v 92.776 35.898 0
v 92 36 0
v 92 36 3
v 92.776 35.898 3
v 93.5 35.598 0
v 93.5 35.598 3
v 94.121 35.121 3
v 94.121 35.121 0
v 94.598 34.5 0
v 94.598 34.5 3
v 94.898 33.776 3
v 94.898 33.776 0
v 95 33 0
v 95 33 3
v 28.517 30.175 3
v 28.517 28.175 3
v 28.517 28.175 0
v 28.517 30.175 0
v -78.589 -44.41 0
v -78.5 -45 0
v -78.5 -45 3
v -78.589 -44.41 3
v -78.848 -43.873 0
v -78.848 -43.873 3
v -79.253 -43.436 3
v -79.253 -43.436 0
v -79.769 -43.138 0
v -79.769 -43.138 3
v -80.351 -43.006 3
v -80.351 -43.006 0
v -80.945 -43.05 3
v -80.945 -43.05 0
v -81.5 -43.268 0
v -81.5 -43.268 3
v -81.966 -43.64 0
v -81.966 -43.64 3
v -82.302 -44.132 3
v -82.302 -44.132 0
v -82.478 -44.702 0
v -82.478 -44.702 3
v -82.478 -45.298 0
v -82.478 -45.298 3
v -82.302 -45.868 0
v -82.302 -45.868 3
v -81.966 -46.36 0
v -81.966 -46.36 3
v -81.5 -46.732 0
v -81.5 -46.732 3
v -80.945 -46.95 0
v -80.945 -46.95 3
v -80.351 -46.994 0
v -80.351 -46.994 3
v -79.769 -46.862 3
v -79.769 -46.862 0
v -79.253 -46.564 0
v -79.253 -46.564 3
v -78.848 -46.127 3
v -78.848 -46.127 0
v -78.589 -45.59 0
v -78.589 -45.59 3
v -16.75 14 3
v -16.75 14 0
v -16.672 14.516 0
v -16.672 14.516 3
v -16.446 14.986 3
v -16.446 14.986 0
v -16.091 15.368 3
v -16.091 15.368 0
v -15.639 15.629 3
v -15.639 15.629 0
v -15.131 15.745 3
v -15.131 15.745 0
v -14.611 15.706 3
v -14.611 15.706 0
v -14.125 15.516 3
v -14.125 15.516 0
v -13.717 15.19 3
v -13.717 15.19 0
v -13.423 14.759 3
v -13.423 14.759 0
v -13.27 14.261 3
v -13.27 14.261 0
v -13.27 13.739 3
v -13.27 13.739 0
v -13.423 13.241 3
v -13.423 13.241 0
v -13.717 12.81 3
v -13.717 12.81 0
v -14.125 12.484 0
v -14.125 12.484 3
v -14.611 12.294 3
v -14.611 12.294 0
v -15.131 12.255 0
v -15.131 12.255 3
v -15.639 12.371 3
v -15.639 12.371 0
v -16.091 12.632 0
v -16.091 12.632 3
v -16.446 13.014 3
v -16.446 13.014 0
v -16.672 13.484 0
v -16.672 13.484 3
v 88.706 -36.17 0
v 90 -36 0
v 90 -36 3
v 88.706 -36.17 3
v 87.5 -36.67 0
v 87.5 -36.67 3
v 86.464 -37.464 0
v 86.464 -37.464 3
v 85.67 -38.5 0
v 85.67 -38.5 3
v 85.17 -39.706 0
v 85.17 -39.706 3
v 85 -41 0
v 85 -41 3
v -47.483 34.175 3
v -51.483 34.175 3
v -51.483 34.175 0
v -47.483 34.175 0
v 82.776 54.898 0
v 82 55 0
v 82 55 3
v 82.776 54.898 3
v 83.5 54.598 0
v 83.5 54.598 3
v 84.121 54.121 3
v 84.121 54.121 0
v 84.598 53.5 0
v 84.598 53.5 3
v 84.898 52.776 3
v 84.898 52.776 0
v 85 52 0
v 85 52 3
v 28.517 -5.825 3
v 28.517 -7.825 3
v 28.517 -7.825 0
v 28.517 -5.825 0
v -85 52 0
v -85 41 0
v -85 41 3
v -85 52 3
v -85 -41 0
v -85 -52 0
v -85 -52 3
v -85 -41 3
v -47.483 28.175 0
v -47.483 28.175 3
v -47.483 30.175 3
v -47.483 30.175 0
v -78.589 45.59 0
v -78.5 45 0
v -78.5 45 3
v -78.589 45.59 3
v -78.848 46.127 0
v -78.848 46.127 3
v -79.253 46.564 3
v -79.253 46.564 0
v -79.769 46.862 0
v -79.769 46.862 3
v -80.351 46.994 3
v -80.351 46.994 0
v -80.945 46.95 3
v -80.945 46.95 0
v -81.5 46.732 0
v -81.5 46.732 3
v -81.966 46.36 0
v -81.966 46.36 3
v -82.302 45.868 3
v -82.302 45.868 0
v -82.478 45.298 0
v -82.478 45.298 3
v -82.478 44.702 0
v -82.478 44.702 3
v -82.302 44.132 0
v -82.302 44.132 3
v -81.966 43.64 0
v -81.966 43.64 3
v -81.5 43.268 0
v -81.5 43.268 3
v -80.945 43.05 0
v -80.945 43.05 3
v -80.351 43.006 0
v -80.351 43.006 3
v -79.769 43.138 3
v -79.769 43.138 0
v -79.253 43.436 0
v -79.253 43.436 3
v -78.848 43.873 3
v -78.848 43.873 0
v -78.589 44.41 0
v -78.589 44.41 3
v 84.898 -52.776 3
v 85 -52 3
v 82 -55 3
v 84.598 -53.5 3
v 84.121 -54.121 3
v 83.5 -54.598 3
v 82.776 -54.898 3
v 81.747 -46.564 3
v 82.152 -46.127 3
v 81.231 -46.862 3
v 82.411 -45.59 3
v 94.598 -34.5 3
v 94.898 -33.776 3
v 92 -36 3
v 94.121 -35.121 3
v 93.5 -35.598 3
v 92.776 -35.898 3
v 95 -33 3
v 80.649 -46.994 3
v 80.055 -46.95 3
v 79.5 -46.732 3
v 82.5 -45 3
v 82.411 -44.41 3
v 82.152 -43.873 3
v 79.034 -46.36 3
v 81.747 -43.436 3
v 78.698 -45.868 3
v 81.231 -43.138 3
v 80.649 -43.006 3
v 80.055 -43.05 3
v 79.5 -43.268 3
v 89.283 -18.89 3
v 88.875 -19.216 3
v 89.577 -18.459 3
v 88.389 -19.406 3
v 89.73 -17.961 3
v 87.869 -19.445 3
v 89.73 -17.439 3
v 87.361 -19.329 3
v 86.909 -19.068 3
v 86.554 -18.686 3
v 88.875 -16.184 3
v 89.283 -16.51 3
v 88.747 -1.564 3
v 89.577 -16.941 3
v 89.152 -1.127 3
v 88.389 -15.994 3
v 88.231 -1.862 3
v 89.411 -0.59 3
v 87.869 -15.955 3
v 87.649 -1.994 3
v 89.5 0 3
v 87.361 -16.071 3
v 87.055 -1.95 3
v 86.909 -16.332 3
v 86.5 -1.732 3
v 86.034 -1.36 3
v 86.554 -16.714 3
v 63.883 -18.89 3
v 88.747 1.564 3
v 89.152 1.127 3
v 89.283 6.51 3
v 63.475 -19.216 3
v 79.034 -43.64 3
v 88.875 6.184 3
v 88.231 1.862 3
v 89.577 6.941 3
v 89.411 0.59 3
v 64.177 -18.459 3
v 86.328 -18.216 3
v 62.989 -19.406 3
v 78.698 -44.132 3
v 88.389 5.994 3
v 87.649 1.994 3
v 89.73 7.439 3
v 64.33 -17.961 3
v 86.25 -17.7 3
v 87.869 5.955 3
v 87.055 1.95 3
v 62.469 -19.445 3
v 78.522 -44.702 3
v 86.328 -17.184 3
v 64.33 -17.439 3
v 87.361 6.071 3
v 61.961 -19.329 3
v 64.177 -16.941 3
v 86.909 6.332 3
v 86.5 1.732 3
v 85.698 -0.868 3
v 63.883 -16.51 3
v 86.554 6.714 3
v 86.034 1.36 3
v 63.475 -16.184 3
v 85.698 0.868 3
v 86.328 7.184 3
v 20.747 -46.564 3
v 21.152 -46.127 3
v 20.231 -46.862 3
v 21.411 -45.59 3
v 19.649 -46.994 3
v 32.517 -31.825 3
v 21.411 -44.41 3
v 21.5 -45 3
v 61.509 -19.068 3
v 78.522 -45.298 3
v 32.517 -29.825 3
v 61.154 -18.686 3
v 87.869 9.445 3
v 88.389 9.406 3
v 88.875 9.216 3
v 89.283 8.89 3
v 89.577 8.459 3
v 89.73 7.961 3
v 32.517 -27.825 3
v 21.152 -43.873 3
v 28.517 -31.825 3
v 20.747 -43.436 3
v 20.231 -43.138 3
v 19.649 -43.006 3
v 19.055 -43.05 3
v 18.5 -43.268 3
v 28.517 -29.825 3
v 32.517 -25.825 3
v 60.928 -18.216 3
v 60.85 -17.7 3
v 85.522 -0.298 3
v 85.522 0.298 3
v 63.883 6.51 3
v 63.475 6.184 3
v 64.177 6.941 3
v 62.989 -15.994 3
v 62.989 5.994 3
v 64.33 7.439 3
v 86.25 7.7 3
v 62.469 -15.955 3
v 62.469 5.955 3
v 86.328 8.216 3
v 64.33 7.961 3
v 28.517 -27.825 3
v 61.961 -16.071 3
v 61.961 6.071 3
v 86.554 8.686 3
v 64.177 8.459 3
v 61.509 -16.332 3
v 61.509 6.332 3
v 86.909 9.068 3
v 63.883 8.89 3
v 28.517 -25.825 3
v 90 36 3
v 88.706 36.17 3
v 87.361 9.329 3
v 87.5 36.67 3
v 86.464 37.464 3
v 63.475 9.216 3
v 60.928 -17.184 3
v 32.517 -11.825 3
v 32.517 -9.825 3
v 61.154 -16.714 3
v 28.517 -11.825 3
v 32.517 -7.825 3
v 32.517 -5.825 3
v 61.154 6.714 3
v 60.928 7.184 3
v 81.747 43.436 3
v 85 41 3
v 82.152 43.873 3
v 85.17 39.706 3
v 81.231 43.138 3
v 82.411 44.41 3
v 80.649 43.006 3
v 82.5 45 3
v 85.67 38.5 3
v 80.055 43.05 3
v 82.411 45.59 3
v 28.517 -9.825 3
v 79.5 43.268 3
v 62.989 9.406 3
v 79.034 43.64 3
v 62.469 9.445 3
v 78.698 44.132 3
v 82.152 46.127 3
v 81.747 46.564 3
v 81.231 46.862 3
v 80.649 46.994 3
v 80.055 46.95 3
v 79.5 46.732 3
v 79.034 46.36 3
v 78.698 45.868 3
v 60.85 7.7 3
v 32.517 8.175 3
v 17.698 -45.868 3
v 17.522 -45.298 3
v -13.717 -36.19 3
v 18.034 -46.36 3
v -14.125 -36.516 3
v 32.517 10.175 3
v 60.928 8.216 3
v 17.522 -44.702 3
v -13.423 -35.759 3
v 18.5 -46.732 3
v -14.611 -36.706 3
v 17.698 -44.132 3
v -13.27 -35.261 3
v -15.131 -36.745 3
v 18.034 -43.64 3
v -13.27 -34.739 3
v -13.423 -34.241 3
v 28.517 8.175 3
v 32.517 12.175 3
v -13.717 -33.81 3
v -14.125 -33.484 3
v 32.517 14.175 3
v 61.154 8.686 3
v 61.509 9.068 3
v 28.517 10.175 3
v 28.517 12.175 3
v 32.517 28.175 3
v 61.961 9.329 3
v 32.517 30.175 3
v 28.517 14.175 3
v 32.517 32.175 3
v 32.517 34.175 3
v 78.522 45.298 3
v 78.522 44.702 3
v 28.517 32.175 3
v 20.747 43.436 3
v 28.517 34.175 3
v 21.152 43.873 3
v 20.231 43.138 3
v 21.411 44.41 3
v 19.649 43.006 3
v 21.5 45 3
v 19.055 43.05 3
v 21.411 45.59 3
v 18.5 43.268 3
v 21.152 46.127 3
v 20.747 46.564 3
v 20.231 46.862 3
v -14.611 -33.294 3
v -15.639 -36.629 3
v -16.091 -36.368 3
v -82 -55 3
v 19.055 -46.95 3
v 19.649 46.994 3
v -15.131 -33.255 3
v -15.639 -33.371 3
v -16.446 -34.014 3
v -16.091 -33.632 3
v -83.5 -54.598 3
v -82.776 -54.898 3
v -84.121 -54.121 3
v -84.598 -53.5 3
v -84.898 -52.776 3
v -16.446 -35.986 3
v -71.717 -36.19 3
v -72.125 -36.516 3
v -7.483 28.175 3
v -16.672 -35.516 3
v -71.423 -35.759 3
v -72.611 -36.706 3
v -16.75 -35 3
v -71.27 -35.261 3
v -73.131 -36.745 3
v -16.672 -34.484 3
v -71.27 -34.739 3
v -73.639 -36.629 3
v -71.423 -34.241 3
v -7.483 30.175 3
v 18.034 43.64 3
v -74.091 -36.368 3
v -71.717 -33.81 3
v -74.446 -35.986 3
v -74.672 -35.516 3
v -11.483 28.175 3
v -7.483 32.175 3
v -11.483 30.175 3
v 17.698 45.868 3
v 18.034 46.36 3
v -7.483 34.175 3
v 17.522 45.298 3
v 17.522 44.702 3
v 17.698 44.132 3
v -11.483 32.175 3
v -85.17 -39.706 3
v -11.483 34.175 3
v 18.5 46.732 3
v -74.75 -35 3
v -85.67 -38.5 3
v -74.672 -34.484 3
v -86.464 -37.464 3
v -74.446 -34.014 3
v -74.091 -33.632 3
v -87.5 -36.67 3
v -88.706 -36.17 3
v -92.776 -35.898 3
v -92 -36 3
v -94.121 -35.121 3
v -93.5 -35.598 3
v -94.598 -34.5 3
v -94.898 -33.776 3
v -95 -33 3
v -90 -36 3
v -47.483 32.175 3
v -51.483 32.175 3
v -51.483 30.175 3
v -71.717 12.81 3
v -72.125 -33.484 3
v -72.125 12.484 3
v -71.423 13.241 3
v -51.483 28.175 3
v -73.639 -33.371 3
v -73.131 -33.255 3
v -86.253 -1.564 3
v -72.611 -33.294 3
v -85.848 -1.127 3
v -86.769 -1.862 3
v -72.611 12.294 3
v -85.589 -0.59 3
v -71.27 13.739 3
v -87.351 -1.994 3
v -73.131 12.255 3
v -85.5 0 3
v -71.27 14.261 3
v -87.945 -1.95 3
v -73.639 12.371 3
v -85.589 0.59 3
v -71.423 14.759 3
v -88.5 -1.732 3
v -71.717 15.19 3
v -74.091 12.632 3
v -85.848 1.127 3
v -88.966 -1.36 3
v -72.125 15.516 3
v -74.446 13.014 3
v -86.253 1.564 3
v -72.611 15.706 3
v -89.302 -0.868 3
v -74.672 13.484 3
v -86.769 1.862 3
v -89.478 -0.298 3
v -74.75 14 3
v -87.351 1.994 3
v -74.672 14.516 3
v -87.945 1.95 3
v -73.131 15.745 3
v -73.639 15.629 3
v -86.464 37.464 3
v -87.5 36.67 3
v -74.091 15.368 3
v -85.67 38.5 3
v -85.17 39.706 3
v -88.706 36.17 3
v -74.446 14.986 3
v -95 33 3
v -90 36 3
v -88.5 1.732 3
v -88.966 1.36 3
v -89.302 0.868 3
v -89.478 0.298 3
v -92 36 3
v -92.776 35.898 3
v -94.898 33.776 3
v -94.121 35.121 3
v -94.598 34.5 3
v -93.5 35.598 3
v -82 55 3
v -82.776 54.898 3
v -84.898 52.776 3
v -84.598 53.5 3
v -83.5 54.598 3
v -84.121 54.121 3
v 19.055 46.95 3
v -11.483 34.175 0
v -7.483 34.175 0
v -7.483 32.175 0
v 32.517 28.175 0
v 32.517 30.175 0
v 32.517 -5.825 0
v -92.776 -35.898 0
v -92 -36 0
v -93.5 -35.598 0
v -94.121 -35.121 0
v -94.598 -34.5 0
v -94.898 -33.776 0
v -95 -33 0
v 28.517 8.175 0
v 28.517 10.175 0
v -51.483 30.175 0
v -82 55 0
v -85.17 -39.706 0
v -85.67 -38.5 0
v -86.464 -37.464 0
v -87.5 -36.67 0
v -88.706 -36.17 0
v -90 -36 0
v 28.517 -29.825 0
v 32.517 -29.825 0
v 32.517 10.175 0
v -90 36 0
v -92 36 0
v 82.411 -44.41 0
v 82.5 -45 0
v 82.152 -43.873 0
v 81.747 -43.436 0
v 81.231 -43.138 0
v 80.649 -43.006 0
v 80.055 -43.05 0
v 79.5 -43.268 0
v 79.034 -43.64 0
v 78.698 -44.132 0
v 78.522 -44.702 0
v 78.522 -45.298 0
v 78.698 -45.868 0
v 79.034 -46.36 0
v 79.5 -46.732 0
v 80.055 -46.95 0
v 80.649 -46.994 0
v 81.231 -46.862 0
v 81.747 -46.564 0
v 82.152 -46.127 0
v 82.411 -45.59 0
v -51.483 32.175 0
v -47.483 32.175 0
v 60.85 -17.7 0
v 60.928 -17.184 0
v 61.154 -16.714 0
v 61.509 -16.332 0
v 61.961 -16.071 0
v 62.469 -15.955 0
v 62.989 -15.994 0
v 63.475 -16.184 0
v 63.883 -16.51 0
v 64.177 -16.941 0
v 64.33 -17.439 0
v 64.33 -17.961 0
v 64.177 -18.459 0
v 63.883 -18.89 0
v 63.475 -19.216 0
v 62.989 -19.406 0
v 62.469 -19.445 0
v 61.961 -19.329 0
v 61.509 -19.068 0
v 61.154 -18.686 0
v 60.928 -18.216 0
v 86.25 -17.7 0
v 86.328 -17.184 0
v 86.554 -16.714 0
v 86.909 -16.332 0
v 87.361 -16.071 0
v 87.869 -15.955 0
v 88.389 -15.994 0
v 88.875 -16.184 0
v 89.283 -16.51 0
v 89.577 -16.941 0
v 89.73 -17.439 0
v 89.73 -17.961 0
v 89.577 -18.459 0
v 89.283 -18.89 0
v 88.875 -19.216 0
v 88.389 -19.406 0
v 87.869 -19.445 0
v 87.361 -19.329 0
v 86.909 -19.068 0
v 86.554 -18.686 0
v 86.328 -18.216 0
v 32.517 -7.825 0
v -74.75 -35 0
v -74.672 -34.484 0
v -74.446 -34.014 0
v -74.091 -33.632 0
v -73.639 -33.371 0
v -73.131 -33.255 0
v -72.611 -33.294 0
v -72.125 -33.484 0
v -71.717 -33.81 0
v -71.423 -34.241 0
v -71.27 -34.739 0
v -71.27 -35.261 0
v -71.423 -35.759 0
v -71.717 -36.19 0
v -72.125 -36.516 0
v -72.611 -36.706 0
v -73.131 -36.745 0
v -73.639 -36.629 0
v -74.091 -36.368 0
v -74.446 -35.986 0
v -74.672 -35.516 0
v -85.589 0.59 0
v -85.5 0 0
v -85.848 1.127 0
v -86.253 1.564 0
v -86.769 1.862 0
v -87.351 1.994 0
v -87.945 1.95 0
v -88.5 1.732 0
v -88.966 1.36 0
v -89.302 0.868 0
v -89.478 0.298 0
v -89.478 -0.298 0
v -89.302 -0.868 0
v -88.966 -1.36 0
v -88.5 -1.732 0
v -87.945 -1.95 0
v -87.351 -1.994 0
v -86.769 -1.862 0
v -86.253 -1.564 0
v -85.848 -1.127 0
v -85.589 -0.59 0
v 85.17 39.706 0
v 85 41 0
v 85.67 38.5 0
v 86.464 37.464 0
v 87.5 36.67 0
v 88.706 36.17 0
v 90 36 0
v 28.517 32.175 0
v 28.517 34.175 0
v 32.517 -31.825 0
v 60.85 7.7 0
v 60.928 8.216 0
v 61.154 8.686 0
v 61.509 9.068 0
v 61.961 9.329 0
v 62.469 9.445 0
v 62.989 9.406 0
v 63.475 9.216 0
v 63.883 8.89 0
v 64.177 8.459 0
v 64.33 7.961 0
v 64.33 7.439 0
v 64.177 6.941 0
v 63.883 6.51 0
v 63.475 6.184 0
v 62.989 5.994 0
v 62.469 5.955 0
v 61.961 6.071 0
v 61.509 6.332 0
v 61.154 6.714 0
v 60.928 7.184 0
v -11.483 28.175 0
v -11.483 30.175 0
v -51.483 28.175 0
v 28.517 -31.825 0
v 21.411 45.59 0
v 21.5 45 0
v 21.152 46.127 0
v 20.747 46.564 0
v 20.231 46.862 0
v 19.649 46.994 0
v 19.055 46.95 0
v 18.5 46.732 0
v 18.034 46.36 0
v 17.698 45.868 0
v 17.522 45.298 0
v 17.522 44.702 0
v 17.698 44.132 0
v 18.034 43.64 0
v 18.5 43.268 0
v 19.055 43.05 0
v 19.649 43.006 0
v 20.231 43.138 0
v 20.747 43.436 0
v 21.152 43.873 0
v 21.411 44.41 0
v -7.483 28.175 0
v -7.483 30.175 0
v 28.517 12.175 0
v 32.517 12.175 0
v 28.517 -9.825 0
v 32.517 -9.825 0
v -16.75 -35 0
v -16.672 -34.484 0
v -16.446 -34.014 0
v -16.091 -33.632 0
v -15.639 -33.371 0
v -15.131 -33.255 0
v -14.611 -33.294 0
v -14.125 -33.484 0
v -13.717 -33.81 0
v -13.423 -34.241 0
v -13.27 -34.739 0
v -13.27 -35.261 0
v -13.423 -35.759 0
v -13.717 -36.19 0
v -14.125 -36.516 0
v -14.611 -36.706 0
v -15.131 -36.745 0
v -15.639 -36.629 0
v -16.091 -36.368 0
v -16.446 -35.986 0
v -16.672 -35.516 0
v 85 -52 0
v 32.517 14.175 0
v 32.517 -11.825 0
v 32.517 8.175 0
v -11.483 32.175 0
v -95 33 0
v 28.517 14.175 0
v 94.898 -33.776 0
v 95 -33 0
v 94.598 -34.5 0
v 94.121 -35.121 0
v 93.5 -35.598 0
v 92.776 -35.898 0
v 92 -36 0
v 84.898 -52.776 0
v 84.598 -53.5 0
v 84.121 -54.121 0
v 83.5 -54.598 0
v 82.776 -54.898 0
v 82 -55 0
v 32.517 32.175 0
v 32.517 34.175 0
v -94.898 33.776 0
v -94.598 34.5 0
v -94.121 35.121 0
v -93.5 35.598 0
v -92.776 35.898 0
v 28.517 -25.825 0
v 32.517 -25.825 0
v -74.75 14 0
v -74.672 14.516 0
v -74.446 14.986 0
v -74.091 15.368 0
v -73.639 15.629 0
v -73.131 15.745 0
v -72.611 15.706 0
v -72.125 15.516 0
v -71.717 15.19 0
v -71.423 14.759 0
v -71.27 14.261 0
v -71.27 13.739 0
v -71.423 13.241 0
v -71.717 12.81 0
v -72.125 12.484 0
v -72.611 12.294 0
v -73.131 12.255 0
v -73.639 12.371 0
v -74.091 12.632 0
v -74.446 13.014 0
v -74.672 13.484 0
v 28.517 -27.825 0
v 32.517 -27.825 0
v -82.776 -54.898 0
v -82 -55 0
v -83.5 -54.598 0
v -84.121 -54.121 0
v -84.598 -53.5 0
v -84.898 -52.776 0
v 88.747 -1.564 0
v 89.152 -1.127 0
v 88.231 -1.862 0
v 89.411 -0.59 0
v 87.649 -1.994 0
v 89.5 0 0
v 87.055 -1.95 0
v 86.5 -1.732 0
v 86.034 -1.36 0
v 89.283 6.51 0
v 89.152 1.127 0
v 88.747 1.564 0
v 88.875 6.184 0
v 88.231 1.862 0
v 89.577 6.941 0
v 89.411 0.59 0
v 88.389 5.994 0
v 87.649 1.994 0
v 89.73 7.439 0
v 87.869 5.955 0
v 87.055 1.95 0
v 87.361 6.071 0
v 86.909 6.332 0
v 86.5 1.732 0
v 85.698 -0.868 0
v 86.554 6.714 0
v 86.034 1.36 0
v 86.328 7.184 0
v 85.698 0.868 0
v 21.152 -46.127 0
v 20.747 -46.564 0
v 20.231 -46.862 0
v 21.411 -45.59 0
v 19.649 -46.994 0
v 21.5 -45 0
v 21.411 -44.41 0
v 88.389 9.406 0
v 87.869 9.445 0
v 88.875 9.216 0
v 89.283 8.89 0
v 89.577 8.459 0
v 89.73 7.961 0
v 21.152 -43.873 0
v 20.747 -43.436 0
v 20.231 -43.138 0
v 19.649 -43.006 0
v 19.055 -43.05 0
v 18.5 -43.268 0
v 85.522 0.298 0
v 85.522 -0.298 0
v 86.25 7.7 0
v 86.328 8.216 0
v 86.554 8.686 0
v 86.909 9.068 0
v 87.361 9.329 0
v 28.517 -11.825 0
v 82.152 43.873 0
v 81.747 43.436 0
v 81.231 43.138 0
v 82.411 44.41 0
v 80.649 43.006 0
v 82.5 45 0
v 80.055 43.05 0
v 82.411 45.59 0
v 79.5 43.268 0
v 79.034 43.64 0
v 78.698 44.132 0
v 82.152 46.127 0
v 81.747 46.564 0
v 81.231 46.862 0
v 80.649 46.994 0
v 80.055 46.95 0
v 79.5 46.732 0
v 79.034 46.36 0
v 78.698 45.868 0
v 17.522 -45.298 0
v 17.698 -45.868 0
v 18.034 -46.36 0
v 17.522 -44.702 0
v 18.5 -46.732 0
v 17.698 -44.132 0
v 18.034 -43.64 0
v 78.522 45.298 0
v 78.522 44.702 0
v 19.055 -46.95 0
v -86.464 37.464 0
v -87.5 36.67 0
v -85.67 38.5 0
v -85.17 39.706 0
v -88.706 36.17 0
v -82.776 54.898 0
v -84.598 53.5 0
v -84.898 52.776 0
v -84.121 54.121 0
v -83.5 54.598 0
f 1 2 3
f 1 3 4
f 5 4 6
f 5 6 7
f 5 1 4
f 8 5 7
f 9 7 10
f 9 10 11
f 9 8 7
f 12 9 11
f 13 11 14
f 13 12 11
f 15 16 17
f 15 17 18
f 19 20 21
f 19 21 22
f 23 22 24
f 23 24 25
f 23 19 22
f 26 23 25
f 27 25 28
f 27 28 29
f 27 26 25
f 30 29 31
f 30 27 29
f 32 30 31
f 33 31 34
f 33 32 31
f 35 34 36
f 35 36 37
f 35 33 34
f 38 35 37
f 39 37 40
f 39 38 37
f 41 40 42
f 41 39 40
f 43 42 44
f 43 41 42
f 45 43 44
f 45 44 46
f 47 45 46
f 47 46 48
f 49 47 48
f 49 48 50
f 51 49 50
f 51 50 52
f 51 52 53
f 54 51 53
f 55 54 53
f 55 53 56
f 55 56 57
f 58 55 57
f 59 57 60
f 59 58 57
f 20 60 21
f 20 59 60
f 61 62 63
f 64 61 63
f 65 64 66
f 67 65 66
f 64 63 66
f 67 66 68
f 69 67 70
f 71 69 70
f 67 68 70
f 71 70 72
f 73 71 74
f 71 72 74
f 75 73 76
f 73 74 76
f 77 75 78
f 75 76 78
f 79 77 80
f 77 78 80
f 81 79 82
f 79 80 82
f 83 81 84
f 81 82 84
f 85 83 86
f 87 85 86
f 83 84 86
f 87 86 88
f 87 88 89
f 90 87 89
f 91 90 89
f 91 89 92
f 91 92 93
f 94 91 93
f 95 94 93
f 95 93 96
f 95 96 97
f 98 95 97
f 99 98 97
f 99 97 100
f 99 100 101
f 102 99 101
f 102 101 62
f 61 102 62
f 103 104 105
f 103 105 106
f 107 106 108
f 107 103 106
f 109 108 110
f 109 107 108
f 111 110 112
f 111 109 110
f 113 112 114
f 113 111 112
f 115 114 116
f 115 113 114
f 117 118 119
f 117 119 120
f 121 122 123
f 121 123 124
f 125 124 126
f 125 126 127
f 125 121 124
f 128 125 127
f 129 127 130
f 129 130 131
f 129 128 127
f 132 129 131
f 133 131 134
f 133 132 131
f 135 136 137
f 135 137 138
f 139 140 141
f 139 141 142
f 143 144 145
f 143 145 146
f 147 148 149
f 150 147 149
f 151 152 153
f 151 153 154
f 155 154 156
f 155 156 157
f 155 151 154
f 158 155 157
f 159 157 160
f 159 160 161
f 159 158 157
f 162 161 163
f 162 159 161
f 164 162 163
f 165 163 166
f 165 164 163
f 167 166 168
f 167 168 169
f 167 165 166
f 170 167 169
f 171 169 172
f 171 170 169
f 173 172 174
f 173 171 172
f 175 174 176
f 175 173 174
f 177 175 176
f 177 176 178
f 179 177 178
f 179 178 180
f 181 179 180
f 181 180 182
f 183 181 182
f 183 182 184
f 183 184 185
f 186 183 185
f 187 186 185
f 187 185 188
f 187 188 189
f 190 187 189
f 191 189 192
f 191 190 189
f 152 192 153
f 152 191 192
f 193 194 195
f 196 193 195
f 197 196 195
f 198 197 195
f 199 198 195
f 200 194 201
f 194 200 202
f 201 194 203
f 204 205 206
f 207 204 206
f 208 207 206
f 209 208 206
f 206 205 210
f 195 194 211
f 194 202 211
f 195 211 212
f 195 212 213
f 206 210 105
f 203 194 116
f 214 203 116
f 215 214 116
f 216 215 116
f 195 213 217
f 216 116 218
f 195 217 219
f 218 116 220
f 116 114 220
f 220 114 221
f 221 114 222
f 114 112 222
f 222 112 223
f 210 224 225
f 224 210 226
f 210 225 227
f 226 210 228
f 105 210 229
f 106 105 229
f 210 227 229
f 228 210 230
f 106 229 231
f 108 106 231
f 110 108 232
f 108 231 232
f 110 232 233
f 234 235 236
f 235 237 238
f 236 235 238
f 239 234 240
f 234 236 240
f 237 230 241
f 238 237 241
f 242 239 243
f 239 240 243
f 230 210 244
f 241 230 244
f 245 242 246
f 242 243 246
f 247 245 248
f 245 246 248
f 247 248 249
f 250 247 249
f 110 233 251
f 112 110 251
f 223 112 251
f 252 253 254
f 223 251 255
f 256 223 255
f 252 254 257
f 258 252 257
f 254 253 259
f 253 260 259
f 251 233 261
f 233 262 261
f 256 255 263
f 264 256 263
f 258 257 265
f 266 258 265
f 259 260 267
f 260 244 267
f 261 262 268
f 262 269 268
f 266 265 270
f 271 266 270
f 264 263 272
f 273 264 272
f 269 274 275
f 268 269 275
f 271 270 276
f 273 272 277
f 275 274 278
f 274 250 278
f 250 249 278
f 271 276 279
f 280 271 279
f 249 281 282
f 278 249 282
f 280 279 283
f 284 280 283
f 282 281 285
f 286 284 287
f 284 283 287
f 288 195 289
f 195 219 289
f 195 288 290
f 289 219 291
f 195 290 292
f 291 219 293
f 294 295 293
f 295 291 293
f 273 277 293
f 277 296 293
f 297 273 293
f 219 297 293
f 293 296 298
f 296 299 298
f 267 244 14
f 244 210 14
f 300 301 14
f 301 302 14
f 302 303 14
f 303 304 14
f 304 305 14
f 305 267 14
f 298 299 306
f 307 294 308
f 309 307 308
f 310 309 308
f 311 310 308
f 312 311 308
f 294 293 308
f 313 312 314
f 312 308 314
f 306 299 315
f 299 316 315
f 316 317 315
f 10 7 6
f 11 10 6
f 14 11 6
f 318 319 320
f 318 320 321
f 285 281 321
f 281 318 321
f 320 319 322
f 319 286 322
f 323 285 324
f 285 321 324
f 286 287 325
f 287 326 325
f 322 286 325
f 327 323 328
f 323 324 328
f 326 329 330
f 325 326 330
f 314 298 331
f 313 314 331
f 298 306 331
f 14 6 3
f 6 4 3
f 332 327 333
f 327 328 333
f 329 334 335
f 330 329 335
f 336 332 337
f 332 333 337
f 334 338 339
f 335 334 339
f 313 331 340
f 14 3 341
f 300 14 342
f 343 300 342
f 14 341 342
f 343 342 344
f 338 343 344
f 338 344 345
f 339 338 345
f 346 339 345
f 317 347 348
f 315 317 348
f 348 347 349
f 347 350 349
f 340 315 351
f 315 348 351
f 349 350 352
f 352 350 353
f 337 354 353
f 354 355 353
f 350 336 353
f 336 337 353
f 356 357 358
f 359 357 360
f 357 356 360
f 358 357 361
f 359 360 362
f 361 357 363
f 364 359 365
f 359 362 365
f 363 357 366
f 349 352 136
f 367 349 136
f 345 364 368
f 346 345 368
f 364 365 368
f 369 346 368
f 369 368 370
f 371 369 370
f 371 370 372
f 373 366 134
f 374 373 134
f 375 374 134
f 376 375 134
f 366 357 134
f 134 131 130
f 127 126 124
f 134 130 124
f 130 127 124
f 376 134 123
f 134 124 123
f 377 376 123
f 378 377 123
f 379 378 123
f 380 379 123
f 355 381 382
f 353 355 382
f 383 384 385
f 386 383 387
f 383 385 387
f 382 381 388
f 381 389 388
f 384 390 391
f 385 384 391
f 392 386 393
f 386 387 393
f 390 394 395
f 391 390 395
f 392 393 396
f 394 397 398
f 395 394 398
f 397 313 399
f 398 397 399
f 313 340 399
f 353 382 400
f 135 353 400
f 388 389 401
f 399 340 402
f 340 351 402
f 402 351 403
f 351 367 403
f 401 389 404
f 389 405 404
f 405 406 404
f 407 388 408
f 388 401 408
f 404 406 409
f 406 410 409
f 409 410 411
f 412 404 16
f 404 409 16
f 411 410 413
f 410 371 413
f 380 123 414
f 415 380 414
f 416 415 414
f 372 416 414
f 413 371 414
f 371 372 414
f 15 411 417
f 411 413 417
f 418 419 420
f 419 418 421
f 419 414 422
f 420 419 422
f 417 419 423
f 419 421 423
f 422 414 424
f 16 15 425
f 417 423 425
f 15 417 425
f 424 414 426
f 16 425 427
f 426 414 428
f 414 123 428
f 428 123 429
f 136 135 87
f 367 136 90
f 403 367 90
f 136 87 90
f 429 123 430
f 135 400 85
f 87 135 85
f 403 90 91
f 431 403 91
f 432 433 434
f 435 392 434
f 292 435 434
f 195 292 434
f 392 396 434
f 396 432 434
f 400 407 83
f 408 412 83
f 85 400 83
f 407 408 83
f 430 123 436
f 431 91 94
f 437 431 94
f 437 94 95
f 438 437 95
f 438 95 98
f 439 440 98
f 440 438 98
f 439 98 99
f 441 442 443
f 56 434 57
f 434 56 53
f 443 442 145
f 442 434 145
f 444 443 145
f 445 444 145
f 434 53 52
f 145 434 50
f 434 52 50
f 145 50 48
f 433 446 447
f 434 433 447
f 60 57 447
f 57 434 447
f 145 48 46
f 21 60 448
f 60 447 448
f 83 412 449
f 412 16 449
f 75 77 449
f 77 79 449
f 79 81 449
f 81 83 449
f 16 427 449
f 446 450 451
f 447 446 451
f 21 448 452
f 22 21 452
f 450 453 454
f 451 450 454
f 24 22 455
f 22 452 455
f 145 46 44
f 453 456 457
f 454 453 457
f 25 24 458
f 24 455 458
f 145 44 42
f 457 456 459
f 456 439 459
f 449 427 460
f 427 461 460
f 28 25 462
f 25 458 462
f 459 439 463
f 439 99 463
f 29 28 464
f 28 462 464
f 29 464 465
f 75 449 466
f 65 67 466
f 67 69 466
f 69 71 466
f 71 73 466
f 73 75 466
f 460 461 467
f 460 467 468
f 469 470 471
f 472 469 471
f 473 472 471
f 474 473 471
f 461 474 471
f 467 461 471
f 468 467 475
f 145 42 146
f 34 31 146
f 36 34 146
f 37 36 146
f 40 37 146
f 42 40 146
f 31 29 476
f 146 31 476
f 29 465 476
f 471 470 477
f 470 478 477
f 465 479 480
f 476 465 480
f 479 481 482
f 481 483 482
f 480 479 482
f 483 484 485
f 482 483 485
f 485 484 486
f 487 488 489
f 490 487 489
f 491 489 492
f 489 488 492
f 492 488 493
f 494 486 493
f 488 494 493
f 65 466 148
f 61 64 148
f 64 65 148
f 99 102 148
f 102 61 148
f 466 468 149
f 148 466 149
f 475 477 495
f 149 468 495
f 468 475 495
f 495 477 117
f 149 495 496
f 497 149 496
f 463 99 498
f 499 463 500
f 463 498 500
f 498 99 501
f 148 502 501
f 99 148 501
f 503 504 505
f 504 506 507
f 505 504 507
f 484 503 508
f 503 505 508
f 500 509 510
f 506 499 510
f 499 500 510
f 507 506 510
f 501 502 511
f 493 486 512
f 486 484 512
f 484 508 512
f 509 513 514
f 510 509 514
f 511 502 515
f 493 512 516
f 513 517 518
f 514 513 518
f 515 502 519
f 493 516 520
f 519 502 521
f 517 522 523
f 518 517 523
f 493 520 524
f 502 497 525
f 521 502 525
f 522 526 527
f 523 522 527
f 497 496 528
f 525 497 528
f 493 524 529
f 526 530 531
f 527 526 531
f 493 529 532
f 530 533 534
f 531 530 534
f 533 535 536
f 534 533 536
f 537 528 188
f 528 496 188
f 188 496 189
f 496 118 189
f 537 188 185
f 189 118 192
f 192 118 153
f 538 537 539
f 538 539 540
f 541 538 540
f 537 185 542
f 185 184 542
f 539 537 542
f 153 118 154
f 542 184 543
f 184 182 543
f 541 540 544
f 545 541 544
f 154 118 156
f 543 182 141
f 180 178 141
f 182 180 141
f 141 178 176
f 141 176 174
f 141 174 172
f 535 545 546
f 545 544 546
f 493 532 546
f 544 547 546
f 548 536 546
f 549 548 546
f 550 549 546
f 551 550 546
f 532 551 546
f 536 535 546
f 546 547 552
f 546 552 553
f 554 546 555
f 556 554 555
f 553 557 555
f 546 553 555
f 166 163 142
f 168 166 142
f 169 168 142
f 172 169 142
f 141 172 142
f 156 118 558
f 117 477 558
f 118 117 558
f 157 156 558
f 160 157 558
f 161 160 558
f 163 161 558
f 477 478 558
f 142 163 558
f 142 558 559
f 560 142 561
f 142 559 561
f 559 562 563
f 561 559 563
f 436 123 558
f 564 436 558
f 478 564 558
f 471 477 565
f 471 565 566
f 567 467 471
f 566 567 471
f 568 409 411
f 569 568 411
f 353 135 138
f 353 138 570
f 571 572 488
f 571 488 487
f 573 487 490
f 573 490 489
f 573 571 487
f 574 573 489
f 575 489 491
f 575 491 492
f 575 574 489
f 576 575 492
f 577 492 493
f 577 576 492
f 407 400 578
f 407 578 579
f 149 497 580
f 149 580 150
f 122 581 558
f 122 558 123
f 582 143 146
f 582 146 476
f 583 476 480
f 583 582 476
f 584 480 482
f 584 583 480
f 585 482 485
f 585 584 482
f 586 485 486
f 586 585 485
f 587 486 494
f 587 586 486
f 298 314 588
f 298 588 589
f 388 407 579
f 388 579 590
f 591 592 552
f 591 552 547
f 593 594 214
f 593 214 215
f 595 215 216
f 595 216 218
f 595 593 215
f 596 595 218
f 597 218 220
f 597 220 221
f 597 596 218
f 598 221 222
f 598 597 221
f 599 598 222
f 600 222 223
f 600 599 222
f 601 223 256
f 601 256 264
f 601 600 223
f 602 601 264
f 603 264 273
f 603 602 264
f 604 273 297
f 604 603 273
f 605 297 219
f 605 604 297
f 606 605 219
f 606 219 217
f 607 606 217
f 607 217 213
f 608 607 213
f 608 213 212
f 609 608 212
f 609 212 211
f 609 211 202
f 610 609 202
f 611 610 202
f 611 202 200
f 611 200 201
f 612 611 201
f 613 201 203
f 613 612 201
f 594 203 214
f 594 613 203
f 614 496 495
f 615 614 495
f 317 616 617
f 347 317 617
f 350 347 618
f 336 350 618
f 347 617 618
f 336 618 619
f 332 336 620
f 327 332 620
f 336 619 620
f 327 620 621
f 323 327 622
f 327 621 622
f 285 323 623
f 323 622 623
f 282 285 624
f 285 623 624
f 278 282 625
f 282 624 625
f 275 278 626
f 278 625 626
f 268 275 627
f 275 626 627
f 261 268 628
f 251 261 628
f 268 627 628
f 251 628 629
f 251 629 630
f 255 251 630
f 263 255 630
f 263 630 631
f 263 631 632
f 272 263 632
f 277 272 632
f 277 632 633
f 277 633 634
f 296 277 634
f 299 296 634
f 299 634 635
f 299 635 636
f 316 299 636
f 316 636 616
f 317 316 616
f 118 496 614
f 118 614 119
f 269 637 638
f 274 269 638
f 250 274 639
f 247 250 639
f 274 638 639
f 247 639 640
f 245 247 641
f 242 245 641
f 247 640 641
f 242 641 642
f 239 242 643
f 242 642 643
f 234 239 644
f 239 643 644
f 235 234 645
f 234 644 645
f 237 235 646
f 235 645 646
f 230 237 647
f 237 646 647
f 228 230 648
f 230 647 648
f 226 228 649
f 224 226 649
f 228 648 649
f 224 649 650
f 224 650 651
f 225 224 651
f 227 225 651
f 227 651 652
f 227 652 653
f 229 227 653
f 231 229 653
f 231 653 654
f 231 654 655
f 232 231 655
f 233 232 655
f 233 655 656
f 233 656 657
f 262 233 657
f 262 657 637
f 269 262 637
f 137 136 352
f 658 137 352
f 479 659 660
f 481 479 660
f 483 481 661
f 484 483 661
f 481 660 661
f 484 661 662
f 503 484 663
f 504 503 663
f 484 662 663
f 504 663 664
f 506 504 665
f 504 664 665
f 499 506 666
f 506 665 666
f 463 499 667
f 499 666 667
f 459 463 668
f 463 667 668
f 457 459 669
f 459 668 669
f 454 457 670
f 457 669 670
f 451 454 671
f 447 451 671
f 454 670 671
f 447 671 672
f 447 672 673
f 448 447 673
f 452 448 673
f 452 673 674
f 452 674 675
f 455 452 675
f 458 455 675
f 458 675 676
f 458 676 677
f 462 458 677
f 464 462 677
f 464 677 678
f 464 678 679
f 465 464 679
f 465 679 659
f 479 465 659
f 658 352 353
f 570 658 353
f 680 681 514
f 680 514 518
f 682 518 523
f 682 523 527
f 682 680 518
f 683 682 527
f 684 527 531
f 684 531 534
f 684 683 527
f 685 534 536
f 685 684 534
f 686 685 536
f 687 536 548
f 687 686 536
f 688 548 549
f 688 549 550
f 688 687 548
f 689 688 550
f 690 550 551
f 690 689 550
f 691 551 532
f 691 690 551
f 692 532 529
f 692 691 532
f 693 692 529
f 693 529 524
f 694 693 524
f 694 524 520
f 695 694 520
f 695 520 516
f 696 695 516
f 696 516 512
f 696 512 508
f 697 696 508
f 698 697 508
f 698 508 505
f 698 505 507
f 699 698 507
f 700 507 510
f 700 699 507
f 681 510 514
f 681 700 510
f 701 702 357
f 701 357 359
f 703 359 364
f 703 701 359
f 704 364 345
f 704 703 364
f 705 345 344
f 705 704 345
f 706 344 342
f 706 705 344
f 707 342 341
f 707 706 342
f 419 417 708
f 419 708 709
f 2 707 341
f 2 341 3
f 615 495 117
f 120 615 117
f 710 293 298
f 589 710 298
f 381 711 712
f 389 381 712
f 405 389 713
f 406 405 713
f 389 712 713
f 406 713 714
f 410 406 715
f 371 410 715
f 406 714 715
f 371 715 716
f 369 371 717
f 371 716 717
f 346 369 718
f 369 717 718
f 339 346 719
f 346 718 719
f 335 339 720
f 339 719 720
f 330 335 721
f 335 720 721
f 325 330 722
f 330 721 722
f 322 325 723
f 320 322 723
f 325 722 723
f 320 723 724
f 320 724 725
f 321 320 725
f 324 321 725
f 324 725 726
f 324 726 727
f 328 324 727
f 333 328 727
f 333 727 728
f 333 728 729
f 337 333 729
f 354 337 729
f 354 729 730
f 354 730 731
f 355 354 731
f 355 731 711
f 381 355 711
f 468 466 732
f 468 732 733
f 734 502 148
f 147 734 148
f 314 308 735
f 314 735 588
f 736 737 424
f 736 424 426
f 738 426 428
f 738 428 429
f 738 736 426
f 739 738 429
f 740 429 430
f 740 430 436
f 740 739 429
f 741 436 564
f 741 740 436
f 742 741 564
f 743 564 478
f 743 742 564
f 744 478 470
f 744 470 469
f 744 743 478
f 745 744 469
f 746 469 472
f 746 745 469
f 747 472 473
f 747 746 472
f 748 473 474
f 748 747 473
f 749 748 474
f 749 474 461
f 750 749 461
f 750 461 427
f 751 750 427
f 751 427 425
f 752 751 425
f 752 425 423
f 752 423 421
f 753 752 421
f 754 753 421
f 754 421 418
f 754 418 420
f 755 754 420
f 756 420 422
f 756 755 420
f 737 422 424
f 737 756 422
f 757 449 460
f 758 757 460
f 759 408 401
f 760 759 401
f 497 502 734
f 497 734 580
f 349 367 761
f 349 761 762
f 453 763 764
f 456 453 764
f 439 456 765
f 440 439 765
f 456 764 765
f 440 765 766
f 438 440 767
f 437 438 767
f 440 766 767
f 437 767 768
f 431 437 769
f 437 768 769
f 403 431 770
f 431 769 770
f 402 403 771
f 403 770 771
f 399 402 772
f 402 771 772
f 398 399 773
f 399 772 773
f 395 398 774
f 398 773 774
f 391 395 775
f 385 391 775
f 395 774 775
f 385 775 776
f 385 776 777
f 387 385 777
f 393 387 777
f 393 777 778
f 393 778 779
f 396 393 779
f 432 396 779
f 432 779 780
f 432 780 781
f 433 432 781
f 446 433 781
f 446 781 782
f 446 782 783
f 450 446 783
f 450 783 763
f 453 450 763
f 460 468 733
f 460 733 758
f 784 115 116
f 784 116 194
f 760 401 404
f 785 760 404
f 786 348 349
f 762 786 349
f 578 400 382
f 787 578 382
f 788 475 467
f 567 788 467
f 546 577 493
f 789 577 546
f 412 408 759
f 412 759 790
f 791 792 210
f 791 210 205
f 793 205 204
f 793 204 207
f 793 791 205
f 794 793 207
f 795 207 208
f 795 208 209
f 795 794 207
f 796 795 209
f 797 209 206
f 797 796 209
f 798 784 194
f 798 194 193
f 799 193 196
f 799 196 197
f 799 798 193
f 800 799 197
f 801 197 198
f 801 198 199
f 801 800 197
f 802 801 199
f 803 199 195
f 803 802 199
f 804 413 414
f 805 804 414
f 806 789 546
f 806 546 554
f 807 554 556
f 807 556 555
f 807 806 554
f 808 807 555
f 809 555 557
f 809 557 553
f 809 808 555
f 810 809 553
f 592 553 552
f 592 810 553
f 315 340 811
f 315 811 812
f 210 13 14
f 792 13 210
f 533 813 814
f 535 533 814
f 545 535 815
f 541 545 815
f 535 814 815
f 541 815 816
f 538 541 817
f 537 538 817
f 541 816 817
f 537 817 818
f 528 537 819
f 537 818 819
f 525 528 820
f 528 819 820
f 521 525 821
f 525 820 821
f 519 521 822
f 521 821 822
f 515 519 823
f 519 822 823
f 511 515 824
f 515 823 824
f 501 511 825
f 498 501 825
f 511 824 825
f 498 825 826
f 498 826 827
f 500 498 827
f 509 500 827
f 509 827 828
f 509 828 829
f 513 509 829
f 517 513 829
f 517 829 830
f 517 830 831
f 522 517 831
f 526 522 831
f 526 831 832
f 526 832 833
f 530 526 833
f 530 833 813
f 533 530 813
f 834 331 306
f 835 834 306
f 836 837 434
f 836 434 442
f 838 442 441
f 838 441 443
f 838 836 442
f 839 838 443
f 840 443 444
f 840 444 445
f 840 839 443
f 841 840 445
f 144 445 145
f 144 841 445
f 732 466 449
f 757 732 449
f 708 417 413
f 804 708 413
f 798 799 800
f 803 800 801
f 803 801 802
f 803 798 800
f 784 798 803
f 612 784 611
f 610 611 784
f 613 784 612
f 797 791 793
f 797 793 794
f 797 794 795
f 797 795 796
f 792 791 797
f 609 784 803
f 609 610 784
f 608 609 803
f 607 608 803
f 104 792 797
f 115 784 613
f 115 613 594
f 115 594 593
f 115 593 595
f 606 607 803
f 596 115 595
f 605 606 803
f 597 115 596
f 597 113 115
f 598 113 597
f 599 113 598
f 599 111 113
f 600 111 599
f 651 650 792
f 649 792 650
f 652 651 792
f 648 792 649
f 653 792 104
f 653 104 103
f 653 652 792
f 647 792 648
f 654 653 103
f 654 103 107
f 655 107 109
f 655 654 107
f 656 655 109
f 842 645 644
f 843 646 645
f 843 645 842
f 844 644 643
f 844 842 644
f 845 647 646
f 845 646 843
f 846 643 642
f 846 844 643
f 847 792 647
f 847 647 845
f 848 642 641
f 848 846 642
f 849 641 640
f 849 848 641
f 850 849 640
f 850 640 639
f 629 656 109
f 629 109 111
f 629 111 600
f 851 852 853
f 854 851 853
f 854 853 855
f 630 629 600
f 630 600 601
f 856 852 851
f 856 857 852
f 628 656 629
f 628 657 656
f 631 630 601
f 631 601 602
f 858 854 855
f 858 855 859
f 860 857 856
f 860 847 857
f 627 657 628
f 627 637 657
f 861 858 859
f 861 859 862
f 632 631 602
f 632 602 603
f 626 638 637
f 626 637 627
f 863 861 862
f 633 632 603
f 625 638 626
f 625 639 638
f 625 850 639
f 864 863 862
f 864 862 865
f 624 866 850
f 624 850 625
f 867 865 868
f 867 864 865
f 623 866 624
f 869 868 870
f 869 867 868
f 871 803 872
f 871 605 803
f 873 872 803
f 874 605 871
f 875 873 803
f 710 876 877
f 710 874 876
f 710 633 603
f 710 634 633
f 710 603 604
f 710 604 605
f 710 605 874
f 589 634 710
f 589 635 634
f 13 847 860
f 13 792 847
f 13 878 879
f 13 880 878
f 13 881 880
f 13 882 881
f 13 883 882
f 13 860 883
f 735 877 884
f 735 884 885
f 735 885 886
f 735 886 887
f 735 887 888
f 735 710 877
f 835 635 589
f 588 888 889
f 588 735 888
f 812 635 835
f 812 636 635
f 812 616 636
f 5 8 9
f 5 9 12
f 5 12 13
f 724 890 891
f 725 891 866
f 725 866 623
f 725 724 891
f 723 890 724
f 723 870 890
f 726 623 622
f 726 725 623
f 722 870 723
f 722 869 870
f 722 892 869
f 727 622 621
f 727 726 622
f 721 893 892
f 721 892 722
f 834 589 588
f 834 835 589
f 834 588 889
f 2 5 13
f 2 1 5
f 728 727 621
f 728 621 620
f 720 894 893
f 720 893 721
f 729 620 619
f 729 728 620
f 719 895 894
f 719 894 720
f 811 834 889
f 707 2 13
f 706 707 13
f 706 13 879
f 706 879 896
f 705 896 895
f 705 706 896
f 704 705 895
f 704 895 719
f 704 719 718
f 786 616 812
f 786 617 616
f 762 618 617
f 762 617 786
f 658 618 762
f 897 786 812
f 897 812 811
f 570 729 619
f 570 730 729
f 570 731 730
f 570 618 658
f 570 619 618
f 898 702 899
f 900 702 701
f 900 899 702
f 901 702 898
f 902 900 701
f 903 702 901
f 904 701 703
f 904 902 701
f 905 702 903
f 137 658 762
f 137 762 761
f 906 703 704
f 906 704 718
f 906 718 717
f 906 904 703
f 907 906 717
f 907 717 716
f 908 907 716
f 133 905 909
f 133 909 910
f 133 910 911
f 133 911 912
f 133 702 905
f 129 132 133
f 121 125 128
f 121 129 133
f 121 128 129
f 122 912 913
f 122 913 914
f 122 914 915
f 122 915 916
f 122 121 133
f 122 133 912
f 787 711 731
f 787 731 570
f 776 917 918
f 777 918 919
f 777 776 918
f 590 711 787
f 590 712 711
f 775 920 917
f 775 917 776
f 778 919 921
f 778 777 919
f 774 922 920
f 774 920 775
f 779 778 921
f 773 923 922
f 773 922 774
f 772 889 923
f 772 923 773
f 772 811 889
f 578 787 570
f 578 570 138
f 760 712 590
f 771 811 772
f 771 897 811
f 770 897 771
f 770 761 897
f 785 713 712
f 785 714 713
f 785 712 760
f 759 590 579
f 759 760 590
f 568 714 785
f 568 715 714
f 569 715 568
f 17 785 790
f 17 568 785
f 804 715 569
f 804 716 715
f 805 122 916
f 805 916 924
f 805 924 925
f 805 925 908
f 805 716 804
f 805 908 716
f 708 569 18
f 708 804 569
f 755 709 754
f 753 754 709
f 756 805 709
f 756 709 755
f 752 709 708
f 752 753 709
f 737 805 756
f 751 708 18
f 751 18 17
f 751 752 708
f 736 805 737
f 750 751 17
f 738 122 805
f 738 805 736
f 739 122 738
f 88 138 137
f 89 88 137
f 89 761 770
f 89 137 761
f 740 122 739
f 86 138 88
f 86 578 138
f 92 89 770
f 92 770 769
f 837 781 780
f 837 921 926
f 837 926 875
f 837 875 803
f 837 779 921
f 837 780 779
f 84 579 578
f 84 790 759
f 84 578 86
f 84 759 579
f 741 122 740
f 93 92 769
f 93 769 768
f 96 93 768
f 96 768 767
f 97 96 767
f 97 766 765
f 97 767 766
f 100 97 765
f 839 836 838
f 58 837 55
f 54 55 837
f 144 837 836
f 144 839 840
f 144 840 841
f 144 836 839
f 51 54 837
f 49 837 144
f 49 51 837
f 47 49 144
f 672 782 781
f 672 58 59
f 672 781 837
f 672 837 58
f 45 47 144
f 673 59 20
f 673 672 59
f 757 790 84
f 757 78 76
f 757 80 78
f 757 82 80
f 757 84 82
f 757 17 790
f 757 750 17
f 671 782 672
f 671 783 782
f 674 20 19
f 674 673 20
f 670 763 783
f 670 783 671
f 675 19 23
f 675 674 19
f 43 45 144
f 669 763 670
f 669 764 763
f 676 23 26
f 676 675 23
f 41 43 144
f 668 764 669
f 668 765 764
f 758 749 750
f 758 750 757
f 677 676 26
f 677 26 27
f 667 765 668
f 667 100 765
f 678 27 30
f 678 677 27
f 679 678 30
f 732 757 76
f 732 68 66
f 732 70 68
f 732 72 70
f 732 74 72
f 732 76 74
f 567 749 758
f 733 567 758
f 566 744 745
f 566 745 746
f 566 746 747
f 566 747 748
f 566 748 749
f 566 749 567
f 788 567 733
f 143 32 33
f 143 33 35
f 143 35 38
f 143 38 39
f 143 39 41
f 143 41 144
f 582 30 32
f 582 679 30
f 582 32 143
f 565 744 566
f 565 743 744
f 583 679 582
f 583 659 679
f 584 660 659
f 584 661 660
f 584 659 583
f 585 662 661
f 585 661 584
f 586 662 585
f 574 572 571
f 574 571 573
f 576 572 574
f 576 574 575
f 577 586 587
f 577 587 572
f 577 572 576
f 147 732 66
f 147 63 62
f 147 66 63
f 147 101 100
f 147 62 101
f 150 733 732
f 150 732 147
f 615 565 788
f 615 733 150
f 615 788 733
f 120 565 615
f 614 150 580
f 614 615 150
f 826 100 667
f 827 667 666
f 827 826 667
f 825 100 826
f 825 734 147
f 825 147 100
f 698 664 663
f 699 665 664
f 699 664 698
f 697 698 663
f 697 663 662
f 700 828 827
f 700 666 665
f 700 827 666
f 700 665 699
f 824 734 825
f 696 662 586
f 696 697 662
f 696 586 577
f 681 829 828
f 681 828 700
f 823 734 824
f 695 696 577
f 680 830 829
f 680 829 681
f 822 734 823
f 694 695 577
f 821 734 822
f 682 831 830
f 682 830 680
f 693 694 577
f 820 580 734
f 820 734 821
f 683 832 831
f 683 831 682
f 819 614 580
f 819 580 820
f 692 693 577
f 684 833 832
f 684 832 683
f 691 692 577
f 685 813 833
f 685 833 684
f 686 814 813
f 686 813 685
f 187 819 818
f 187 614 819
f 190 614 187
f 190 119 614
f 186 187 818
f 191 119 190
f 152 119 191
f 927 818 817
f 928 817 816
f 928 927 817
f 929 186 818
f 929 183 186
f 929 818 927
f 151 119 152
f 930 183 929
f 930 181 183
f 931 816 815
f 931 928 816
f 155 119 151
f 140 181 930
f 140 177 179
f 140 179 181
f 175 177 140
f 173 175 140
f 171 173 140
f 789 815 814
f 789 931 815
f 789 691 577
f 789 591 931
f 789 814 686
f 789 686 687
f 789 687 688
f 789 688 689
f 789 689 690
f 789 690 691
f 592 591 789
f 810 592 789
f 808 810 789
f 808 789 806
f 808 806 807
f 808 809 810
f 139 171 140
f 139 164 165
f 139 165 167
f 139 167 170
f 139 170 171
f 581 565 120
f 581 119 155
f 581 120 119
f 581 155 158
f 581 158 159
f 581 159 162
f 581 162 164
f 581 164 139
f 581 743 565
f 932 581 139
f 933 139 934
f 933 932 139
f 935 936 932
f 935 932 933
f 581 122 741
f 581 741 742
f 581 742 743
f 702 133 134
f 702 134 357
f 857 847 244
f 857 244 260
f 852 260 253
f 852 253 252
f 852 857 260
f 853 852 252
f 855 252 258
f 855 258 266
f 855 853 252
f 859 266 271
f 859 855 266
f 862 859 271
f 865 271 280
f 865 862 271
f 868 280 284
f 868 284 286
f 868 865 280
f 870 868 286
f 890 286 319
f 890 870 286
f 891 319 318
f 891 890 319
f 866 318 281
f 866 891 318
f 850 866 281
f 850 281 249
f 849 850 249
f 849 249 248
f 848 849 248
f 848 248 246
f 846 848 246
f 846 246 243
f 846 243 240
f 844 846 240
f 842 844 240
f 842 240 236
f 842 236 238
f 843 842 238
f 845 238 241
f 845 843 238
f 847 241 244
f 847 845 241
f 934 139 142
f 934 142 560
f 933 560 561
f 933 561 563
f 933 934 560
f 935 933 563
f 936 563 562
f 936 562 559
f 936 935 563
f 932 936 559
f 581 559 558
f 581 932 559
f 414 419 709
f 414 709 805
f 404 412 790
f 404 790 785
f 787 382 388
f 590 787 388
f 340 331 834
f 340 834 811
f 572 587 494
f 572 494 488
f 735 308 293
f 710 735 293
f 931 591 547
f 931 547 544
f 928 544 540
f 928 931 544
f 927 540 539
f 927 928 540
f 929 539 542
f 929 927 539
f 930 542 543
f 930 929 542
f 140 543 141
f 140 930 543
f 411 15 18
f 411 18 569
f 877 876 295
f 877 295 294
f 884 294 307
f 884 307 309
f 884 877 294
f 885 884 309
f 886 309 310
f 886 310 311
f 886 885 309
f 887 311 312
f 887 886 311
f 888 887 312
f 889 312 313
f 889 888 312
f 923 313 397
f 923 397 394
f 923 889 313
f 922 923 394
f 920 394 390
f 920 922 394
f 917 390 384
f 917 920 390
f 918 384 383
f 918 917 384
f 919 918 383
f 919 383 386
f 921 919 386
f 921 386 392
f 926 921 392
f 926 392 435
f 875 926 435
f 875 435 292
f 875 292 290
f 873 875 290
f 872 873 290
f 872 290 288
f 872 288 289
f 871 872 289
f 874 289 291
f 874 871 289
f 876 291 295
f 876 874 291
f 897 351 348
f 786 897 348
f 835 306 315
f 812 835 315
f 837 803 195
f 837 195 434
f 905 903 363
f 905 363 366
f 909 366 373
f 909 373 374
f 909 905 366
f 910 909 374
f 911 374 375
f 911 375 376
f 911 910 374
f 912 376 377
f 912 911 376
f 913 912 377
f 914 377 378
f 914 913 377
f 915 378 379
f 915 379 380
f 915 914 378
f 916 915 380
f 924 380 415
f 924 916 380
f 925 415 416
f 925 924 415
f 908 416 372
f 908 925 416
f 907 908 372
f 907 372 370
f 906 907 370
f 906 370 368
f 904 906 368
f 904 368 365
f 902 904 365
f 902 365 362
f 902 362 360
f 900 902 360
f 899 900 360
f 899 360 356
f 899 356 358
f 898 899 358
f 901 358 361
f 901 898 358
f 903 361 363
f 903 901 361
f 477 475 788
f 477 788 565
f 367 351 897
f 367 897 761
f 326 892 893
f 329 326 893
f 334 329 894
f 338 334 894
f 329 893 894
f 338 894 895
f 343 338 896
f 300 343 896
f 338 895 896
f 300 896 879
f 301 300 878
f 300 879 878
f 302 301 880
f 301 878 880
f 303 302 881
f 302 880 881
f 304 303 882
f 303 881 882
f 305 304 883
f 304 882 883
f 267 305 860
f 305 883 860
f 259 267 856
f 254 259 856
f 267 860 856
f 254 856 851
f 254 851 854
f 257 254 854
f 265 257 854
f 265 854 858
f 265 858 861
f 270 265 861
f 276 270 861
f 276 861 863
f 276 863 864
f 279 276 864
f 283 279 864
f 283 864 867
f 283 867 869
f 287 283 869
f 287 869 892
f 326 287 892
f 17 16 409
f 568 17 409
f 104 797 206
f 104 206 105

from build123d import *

# Parameters (mm, degrees)
SKETCH1_R                  = 2
BOSS_EXTRUDE1_DEPTH        = 3
F_3_5_3_5_DIAMETER_HOLE1_D = 3.5
SKETCH4_W                  = 4
SKETCH4_H                  = 2
CUT_EXTRUDE1_DEPTH         = 110.813478226


with BuildPart() as part:
    # Sketch1 → Boss-Extrude1 (new body)
    with BuildSketch(Plane.XY):
        with BuildLine():
            Line((-82, 55), (82, 55))
            ThreePointArc((82, 55), (84.121320344, 54.121320344), (85, 52))
            Line((85, 52), (85, 41))
            ThreePointArc((85, 41), (86.464466094, 37.464466094), (90, 36))
            Line((90, 36), (92, 36))
            ThreePointArc((92, 36), (94.121320344, 35.121320344), (95, 33))
            Line((95, 33), (95, -33))
            ThreePointArc((95, -33), (94.121320344, -35.121320344), (92, -36))
            Line((92, -36), (90, -36))
            ThreePointArc((90, -36), (86.464466094, -37.464466094), (85, -41))
            Line((85, -41), (85, -52))
            ThreePointArc((85, -52), (84.121320344, -54.121320344), (82, -55))
            Line((82, -55), (-82, -55))
            ThreePointArc((-82, -55), (-84.121320344, -54.121320344), (-85, -52))
            Line((-85, -52), (-85, -41))
            ThreePointArc((-85, -41), (-86.464466094, -37.464466094), (-90, -36))
            Line((-90, -36), (-92, -36))
            ThreePointArc((-92, -36), (-94.121320344, -35.121320344), (-95, -33))
            Line((-95, -33), (-95, 33))
            ThreePointArc((-95, 33), (-94.121320344, 35.121320344), (-92, 36))
            Line((-92, 36), (-90, 36))
            ThreePointArc((-90, 36), (-86.464466094, 37.464466094), (-85, 41))
            Line((-85, 41), (-85, 52))
            ThreePointArc((-85, 52), (-84.121320344, 54.121320344), (-82, 55))
        make_face()
        with Locations((-80.5, 45)):
            Circle(SKETCH1_R, mode=Mode.SUBTRACT)
        with Locations((19.5, 45)):
            Circle(SKETCH1_R, mode=Mode.SUBTRACT)
        with Locations((80.5, 45)):
            Circle(SKETCH1_R, mode=Mode.SUBTRACT)
        with Locations((-80.5, -45)):
            Circle(SKETCH1_R, mode=Mode.SUBTRACT)
        with Locations((-87.5, 0)):
            Circle(SKETCH1_R, mode=Mode.SUBTRACT)
        with Locations((87.5, 0)):
            Circle(SKETCH1_R, mode=Mode.SUBTRACT)
        with Locations((19.5, -45)):
            Circle(SKETCH1_R, mode=Mode.SUBTRACT)
        with Locations((80.5, -45)):
            Circle(SKETCH1_R, mode=Mode.SUBTRACT)
    extrude(amount=BOSS_EXTRUDE1_DEPTH)

    # Ø3.5 (3.5) Diameter Hole1 (through all)
    with Locations(Plane.XY.offset(3)):
        with Locations((88, 7.7), (88, -17.7), (62.6, -17.7), (62.6, 7.7), (-73, 14), (-15, 14), (-15, -35), (-73, -35)):
            Hole(F_3_5_3_5_DIAMETER_HOLE1_D / 2)

    # Sketch4 → Cut-Extrude1 (cut, through all)
    with BuildSketch(Plane.XY.offset(3)):
        with Locations((-9.482801071, 33.175325002)):
            Rectangle(SKETCH4_W, SKETCH4_H)
        with Locations((-49.482801071, 33.175325002)):
            Rectangle(SKETCH4_W, SKETCH4_H)
        with Locations((-49.482801071, 29.175325002)):
            Rectangle(SKETCH4_W, SKETCH4_H)
        with Locations((-9.482801071, 29.175325002)):
            Rectangle(SKETCH4_W, SKETCH4_H)
        with Locations((30.517198929, 33.175325002)):
            Rectangle(SKETCH4_W, SKETCH4_H)
        with Locations((30.517198929, 29.175325002)):
            Rectangle(SKETCH4_W, SKETCH4_H)
        with Locations((30.517198929, 13.175325002)):
            Rectangle(SKETCH4_W, SKETCH4_H)
        with Locations((30.517198929, 9.175325002)):
            Rectangle(SKETCH4_W, SKETCH4_H)
        with Locations((30.517198929, -6.824674998)):
            Rectangle(SKETCH4_W, SKETCH4_H)
        with Locations((30.517198929, -10.824674998)):
            Rectangle(SKETCH4_W, SKETCH4_H)
        with Locations((30.517198929, -26.824674998)):
            Rectangle(SKETCH4_W, SKETCH4_H)
        with Locations((30.517198929, -30.824674998)):
            Rectangle(SKETCH4_W, SKETCH4_H)
    extrude(amount=-CUT_EXTRUDE1_DEPTH, mode=Mode.SUBTRACT)


solid = part.part
